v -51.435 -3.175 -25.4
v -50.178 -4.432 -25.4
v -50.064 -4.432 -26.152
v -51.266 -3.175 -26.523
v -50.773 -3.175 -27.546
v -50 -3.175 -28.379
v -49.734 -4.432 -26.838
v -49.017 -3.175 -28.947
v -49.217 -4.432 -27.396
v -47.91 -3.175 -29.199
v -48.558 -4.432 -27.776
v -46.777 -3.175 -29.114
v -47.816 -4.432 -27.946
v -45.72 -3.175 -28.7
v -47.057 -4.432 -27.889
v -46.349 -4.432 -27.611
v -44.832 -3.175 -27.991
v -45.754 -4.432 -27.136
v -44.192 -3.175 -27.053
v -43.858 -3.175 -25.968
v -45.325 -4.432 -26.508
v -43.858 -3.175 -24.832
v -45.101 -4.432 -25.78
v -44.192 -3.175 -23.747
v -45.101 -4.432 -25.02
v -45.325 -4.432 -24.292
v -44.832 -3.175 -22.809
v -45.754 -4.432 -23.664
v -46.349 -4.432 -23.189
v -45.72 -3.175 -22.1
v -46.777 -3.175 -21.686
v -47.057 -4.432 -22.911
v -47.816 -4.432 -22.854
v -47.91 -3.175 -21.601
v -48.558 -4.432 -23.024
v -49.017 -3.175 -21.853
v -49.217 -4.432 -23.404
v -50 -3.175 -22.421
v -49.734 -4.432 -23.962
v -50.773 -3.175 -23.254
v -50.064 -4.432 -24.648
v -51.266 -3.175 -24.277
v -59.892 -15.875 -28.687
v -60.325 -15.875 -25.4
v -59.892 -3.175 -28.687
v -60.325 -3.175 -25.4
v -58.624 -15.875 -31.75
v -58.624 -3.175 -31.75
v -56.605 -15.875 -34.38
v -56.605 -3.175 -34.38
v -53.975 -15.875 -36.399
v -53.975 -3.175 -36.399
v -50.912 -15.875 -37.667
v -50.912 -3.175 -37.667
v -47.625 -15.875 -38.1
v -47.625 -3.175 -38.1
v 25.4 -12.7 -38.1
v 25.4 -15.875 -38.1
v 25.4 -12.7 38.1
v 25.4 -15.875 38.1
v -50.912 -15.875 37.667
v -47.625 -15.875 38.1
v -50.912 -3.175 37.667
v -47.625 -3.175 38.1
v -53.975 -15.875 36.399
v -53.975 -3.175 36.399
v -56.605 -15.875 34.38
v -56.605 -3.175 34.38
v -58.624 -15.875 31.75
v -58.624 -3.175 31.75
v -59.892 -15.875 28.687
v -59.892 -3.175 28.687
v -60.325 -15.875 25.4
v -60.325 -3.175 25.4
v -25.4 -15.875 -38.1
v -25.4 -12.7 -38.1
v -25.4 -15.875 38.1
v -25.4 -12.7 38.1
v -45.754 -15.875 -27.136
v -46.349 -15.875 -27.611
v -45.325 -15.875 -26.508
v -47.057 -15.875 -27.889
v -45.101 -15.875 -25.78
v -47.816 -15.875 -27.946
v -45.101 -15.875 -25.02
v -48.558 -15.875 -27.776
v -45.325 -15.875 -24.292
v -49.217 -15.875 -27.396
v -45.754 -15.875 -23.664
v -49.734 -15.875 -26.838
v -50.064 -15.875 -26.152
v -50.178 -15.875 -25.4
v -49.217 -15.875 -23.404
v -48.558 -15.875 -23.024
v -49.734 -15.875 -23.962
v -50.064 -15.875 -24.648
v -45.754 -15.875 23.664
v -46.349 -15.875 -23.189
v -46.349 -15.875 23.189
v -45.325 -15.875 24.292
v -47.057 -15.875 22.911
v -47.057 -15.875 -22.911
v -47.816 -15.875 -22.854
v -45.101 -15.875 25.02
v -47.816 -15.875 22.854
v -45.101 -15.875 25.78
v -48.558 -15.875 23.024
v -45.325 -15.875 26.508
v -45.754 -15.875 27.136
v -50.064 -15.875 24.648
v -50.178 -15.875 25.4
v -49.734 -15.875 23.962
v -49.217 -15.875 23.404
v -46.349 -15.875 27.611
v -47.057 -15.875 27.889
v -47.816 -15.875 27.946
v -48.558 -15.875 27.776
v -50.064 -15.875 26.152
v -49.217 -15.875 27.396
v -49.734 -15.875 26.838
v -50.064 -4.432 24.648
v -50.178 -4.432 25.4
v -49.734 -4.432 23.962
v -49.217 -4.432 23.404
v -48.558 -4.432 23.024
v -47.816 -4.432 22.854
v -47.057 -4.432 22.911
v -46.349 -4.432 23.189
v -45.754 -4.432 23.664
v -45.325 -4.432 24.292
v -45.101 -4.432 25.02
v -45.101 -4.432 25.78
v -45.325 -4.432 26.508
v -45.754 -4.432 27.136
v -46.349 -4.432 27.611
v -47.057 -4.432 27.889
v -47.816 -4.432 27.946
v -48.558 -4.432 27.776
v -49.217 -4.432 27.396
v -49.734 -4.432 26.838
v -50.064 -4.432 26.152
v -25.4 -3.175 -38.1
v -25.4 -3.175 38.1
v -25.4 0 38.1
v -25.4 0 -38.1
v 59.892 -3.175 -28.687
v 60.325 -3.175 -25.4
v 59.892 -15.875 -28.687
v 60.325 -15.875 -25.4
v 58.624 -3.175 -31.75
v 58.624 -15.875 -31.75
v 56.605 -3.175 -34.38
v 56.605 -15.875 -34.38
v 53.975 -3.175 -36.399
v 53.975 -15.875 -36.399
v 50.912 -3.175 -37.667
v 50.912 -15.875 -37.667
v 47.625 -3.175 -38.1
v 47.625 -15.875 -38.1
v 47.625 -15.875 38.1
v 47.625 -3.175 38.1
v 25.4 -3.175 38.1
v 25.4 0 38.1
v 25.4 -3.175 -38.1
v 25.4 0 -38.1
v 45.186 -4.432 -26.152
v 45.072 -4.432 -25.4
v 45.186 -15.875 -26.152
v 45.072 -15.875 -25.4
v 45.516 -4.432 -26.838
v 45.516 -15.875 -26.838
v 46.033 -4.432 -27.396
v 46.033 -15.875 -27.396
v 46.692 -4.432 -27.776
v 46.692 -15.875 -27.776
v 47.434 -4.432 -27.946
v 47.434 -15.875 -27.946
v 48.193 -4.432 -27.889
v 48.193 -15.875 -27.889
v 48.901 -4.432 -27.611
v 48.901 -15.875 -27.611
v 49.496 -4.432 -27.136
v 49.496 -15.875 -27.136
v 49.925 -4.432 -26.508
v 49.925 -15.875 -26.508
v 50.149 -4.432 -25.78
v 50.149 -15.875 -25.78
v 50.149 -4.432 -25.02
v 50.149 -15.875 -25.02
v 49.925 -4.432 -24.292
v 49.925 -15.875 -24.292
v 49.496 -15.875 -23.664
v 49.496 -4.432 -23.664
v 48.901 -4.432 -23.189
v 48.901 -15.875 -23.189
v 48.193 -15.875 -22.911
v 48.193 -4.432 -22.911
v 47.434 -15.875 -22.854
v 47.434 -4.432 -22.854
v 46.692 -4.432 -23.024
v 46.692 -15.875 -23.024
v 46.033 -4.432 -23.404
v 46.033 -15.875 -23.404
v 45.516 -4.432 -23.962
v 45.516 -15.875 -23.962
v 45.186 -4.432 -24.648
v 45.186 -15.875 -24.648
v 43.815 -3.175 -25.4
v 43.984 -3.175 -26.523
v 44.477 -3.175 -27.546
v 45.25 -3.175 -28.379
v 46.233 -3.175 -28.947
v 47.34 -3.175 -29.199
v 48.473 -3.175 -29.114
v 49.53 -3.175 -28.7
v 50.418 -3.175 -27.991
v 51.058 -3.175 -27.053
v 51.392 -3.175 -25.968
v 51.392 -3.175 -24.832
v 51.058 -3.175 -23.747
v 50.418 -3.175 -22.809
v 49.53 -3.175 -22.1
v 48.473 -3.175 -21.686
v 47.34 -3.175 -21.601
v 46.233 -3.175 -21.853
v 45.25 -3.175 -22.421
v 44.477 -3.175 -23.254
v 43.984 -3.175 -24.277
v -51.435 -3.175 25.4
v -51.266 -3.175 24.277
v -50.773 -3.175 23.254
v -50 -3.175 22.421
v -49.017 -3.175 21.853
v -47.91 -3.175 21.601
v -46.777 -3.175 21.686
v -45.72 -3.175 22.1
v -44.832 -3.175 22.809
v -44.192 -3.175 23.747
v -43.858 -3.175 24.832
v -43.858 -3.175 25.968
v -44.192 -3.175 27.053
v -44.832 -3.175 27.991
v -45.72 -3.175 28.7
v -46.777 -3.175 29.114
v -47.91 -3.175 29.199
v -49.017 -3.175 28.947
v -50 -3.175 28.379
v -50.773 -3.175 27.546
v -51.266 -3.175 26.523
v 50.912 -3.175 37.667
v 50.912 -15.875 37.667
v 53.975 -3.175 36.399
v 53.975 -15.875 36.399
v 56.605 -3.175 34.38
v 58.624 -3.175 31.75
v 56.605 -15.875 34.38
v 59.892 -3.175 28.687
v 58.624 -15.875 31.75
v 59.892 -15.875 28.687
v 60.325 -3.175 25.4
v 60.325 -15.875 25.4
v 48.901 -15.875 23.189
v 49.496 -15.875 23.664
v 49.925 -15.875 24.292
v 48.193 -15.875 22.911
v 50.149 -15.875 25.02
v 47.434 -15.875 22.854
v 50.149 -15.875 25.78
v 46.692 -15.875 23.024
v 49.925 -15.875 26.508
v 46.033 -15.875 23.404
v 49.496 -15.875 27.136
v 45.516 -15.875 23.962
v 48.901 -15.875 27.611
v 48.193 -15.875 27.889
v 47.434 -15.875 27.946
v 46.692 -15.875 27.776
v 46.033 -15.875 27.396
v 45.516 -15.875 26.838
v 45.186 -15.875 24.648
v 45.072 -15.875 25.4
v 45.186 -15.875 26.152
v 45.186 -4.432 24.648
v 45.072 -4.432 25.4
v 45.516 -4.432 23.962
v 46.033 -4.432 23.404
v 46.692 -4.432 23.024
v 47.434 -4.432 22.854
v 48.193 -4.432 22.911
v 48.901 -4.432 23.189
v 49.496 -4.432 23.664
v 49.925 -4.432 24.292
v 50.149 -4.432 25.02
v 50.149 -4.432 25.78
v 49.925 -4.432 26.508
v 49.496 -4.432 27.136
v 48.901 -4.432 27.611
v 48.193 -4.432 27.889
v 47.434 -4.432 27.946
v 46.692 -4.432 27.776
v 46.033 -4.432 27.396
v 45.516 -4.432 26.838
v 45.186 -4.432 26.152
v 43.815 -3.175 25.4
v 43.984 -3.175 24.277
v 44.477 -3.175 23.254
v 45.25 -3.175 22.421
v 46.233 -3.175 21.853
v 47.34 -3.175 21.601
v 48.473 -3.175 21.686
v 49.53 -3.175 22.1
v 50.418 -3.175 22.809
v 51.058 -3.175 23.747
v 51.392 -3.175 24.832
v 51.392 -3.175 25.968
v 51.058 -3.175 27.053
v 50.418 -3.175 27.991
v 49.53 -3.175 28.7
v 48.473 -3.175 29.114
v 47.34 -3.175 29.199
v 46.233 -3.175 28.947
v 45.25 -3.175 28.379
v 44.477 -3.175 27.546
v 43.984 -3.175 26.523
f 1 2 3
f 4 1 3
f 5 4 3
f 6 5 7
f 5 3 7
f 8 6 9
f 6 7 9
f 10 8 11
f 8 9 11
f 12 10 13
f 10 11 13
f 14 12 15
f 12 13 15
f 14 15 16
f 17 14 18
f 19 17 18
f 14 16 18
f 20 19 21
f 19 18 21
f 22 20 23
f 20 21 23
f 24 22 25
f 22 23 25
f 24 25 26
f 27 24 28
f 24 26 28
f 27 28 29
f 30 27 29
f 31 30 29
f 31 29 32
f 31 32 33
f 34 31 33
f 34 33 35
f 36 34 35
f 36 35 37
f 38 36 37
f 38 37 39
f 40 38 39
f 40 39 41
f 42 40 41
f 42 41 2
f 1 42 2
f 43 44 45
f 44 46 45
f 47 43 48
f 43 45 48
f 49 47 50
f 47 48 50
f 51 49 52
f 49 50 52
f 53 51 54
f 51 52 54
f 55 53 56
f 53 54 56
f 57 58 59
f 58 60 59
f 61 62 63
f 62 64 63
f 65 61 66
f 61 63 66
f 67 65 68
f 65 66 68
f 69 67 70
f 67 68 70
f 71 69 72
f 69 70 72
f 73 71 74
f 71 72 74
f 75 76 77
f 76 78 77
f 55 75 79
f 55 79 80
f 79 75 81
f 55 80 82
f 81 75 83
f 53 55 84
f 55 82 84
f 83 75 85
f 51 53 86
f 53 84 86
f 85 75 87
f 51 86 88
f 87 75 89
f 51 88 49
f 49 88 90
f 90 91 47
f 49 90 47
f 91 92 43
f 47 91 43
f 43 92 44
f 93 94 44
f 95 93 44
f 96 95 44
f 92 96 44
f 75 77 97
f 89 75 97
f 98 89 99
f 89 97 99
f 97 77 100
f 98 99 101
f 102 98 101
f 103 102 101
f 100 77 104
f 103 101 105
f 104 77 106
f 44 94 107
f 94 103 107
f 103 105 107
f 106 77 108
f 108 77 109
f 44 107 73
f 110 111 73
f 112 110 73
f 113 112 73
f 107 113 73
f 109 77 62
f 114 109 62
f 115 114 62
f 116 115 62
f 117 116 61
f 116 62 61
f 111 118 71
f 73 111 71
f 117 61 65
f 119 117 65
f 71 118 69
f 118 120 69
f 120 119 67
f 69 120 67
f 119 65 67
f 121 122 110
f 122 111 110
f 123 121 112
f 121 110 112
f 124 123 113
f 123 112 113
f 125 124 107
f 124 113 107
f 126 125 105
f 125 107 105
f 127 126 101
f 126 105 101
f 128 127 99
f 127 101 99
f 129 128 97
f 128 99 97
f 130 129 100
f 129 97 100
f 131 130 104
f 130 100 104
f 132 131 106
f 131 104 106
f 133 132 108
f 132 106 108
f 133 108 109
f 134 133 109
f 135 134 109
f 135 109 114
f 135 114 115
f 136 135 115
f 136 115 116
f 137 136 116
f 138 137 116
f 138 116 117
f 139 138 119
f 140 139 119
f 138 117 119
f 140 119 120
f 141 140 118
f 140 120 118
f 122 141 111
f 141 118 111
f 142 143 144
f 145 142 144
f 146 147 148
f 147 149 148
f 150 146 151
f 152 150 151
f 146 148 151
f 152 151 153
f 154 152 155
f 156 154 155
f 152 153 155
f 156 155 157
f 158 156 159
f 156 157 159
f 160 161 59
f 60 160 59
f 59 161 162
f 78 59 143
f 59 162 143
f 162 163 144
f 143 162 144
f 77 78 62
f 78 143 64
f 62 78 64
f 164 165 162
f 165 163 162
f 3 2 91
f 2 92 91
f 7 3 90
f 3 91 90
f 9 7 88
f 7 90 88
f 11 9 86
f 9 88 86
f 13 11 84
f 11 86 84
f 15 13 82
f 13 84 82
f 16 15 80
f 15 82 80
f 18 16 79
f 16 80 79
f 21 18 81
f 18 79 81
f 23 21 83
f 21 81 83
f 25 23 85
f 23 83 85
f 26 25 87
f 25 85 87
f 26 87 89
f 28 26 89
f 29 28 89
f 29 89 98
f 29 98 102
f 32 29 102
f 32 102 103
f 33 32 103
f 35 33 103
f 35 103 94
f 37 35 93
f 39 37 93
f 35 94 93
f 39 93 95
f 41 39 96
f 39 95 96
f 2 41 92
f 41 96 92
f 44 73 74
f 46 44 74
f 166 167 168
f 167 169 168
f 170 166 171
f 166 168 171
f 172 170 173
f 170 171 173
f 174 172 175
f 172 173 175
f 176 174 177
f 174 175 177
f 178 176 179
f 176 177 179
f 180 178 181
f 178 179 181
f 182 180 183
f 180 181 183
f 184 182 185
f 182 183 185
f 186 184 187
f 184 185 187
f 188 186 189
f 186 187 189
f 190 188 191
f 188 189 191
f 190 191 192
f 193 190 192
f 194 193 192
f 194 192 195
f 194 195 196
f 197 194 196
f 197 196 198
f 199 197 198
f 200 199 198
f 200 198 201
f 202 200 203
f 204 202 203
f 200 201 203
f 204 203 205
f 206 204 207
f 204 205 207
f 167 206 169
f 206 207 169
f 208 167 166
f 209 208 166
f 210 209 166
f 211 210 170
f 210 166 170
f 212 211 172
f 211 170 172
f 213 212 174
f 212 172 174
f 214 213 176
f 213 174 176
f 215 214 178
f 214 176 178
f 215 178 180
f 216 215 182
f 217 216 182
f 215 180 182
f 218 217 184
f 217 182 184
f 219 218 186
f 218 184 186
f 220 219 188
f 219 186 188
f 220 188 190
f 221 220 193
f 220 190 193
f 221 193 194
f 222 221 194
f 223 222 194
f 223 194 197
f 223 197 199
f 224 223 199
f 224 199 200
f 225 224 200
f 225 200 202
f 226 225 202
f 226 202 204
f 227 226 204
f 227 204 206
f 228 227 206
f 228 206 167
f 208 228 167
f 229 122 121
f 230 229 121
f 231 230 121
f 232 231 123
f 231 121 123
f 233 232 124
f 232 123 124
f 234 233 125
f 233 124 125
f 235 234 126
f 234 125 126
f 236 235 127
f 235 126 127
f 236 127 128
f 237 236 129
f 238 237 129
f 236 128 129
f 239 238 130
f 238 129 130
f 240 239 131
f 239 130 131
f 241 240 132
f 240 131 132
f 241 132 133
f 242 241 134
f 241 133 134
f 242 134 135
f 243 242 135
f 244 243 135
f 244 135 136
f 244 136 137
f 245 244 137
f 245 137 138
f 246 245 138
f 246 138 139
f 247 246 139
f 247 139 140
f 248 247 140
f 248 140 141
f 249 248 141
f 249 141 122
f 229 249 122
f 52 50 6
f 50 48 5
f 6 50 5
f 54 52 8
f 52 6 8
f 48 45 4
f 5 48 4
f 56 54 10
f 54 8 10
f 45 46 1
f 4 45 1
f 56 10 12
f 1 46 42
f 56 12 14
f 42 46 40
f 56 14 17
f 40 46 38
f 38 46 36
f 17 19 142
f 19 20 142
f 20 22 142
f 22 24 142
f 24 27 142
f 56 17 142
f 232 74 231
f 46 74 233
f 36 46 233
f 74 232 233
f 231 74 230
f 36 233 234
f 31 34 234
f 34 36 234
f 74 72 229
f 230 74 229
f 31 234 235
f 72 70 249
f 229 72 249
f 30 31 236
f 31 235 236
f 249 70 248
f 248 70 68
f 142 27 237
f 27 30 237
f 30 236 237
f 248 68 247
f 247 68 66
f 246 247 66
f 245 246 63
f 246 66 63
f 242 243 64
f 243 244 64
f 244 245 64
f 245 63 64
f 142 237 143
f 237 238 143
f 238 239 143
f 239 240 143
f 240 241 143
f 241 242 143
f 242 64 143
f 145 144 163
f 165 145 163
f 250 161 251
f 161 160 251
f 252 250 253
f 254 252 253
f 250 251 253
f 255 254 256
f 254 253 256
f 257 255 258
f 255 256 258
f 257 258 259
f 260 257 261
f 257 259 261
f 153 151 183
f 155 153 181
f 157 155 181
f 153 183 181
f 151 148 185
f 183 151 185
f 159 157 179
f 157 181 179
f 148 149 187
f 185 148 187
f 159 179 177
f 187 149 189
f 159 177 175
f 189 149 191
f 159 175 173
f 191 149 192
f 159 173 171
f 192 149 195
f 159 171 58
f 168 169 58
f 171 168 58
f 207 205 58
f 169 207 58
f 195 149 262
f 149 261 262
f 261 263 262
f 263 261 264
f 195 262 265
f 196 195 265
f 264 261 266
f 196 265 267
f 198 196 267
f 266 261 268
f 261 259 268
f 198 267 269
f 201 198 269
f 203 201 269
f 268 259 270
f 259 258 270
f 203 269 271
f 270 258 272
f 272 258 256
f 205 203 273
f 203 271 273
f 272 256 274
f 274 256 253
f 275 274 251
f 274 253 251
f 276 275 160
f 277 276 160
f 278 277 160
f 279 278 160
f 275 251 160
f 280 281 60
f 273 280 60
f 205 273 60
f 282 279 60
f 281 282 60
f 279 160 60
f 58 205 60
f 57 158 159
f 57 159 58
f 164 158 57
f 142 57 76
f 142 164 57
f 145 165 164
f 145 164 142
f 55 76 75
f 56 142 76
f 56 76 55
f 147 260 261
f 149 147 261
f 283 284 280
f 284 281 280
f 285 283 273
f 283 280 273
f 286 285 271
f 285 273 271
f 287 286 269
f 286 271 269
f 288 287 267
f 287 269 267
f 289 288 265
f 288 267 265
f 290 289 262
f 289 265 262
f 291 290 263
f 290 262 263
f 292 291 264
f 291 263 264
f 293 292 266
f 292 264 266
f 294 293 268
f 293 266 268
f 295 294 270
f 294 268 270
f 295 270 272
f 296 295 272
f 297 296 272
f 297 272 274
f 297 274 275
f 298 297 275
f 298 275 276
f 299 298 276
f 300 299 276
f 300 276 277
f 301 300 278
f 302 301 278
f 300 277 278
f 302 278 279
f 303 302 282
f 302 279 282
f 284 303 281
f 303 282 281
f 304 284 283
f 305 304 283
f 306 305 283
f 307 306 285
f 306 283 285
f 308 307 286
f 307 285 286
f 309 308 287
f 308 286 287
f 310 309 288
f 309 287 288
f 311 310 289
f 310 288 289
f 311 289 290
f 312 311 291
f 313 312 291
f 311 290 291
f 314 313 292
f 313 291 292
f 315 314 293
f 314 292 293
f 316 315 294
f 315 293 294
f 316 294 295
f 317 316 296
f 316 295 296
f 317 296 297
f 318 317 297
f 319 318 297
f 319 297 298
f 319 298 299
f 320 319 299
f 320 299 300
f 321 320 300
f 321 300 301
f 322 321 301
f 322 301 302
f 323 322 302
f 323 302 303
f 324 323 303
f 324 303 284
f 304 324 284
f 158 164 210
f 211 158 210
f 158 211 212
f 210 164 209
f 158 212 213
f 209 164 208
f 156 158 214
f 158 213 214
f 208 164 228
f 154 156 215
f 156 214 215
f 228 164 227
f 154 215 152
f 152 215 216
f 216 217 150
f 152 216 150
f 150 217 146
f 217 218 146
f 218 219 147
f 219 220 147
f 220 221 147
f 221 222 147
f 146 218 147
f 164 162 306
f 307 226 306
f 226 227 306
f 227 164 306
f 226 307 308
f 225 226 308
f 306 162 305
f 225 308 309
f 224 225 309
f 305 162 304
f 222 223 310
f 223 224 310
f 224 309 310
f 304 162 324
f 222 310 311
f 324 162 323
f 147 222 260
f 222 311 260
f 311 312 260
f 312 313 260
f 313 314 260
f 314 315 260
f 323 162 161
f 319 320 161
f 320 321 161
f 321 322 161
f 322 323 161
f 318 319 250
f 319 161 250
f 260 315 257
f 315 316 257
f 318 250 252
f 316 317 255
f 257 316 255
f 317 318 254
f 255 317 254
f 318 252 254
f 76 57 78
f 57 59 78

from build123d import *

# Parameters (mm, degrees)
BOSS_EXTRUDE1_DEPTH               = 38.1
FILLET1_R                         = 12.7
F_1_4_20_TAPPED_HOLE1_D           = 5.1054
F_1_4_20_TAPPED_HOLE1_CSINK_D     = 7.62
F_1_4_20_TAPPED_HOLE1_CSINK_ANGLE = 90


with BuildPart() as part:
    # Sketch1 → Boss-Extrude1 (new, symmetric)
    with BuildSketch(Plane.XY):
        Polygon((-25.4, 0), (25.4, 0), (25.4, -3.175), (60.325, -3.175), (60.325, -15.875), (25.4, -15.875), (25.4, -12.7), (-25.4, -12.7), (-25.4, -15.875), (-60.325, -15.875), (-60.325, -3.175), (-25.4, -3.175), align=None)
    extrude(amount=BOSS_EXTRUDE1_DEPTH, both=True)

    # Fillet1
    fillet1_edges = [part.edges().sort_by_distance(p)[0] for p in [
        (-60.325, -9.525, 38.1),
        (60.325, -9.525, -38.1),
        (-60.325, -9.525, -38.1),
        (60.325, -9.525, 38.1),
    ]]
    fillet(fillet1_edges, radius=FILLET1_R)

    # 1/4-20 Tapped Hole1 (through all)
    with Locations(Plane(origin=(0, -3.175, 0), x_dir=(1, 0, 0), z_dir=(0, 1, 0))):
        with Locations((-47.625, 25.4), (-47.625, -25.4), (47.625, -25.4), (47.625, 25.4)):
            CounterSinkHole(F_1_4_20_TAPPED_HOLE1_D / 2, F_1_4_20_TAPPED_HOLE1_CSINK_D / 2, counter_sink_angle=F_1_4_20_TAPPED_HOLE1_CSINK_ANGLE)


solid = part.part
